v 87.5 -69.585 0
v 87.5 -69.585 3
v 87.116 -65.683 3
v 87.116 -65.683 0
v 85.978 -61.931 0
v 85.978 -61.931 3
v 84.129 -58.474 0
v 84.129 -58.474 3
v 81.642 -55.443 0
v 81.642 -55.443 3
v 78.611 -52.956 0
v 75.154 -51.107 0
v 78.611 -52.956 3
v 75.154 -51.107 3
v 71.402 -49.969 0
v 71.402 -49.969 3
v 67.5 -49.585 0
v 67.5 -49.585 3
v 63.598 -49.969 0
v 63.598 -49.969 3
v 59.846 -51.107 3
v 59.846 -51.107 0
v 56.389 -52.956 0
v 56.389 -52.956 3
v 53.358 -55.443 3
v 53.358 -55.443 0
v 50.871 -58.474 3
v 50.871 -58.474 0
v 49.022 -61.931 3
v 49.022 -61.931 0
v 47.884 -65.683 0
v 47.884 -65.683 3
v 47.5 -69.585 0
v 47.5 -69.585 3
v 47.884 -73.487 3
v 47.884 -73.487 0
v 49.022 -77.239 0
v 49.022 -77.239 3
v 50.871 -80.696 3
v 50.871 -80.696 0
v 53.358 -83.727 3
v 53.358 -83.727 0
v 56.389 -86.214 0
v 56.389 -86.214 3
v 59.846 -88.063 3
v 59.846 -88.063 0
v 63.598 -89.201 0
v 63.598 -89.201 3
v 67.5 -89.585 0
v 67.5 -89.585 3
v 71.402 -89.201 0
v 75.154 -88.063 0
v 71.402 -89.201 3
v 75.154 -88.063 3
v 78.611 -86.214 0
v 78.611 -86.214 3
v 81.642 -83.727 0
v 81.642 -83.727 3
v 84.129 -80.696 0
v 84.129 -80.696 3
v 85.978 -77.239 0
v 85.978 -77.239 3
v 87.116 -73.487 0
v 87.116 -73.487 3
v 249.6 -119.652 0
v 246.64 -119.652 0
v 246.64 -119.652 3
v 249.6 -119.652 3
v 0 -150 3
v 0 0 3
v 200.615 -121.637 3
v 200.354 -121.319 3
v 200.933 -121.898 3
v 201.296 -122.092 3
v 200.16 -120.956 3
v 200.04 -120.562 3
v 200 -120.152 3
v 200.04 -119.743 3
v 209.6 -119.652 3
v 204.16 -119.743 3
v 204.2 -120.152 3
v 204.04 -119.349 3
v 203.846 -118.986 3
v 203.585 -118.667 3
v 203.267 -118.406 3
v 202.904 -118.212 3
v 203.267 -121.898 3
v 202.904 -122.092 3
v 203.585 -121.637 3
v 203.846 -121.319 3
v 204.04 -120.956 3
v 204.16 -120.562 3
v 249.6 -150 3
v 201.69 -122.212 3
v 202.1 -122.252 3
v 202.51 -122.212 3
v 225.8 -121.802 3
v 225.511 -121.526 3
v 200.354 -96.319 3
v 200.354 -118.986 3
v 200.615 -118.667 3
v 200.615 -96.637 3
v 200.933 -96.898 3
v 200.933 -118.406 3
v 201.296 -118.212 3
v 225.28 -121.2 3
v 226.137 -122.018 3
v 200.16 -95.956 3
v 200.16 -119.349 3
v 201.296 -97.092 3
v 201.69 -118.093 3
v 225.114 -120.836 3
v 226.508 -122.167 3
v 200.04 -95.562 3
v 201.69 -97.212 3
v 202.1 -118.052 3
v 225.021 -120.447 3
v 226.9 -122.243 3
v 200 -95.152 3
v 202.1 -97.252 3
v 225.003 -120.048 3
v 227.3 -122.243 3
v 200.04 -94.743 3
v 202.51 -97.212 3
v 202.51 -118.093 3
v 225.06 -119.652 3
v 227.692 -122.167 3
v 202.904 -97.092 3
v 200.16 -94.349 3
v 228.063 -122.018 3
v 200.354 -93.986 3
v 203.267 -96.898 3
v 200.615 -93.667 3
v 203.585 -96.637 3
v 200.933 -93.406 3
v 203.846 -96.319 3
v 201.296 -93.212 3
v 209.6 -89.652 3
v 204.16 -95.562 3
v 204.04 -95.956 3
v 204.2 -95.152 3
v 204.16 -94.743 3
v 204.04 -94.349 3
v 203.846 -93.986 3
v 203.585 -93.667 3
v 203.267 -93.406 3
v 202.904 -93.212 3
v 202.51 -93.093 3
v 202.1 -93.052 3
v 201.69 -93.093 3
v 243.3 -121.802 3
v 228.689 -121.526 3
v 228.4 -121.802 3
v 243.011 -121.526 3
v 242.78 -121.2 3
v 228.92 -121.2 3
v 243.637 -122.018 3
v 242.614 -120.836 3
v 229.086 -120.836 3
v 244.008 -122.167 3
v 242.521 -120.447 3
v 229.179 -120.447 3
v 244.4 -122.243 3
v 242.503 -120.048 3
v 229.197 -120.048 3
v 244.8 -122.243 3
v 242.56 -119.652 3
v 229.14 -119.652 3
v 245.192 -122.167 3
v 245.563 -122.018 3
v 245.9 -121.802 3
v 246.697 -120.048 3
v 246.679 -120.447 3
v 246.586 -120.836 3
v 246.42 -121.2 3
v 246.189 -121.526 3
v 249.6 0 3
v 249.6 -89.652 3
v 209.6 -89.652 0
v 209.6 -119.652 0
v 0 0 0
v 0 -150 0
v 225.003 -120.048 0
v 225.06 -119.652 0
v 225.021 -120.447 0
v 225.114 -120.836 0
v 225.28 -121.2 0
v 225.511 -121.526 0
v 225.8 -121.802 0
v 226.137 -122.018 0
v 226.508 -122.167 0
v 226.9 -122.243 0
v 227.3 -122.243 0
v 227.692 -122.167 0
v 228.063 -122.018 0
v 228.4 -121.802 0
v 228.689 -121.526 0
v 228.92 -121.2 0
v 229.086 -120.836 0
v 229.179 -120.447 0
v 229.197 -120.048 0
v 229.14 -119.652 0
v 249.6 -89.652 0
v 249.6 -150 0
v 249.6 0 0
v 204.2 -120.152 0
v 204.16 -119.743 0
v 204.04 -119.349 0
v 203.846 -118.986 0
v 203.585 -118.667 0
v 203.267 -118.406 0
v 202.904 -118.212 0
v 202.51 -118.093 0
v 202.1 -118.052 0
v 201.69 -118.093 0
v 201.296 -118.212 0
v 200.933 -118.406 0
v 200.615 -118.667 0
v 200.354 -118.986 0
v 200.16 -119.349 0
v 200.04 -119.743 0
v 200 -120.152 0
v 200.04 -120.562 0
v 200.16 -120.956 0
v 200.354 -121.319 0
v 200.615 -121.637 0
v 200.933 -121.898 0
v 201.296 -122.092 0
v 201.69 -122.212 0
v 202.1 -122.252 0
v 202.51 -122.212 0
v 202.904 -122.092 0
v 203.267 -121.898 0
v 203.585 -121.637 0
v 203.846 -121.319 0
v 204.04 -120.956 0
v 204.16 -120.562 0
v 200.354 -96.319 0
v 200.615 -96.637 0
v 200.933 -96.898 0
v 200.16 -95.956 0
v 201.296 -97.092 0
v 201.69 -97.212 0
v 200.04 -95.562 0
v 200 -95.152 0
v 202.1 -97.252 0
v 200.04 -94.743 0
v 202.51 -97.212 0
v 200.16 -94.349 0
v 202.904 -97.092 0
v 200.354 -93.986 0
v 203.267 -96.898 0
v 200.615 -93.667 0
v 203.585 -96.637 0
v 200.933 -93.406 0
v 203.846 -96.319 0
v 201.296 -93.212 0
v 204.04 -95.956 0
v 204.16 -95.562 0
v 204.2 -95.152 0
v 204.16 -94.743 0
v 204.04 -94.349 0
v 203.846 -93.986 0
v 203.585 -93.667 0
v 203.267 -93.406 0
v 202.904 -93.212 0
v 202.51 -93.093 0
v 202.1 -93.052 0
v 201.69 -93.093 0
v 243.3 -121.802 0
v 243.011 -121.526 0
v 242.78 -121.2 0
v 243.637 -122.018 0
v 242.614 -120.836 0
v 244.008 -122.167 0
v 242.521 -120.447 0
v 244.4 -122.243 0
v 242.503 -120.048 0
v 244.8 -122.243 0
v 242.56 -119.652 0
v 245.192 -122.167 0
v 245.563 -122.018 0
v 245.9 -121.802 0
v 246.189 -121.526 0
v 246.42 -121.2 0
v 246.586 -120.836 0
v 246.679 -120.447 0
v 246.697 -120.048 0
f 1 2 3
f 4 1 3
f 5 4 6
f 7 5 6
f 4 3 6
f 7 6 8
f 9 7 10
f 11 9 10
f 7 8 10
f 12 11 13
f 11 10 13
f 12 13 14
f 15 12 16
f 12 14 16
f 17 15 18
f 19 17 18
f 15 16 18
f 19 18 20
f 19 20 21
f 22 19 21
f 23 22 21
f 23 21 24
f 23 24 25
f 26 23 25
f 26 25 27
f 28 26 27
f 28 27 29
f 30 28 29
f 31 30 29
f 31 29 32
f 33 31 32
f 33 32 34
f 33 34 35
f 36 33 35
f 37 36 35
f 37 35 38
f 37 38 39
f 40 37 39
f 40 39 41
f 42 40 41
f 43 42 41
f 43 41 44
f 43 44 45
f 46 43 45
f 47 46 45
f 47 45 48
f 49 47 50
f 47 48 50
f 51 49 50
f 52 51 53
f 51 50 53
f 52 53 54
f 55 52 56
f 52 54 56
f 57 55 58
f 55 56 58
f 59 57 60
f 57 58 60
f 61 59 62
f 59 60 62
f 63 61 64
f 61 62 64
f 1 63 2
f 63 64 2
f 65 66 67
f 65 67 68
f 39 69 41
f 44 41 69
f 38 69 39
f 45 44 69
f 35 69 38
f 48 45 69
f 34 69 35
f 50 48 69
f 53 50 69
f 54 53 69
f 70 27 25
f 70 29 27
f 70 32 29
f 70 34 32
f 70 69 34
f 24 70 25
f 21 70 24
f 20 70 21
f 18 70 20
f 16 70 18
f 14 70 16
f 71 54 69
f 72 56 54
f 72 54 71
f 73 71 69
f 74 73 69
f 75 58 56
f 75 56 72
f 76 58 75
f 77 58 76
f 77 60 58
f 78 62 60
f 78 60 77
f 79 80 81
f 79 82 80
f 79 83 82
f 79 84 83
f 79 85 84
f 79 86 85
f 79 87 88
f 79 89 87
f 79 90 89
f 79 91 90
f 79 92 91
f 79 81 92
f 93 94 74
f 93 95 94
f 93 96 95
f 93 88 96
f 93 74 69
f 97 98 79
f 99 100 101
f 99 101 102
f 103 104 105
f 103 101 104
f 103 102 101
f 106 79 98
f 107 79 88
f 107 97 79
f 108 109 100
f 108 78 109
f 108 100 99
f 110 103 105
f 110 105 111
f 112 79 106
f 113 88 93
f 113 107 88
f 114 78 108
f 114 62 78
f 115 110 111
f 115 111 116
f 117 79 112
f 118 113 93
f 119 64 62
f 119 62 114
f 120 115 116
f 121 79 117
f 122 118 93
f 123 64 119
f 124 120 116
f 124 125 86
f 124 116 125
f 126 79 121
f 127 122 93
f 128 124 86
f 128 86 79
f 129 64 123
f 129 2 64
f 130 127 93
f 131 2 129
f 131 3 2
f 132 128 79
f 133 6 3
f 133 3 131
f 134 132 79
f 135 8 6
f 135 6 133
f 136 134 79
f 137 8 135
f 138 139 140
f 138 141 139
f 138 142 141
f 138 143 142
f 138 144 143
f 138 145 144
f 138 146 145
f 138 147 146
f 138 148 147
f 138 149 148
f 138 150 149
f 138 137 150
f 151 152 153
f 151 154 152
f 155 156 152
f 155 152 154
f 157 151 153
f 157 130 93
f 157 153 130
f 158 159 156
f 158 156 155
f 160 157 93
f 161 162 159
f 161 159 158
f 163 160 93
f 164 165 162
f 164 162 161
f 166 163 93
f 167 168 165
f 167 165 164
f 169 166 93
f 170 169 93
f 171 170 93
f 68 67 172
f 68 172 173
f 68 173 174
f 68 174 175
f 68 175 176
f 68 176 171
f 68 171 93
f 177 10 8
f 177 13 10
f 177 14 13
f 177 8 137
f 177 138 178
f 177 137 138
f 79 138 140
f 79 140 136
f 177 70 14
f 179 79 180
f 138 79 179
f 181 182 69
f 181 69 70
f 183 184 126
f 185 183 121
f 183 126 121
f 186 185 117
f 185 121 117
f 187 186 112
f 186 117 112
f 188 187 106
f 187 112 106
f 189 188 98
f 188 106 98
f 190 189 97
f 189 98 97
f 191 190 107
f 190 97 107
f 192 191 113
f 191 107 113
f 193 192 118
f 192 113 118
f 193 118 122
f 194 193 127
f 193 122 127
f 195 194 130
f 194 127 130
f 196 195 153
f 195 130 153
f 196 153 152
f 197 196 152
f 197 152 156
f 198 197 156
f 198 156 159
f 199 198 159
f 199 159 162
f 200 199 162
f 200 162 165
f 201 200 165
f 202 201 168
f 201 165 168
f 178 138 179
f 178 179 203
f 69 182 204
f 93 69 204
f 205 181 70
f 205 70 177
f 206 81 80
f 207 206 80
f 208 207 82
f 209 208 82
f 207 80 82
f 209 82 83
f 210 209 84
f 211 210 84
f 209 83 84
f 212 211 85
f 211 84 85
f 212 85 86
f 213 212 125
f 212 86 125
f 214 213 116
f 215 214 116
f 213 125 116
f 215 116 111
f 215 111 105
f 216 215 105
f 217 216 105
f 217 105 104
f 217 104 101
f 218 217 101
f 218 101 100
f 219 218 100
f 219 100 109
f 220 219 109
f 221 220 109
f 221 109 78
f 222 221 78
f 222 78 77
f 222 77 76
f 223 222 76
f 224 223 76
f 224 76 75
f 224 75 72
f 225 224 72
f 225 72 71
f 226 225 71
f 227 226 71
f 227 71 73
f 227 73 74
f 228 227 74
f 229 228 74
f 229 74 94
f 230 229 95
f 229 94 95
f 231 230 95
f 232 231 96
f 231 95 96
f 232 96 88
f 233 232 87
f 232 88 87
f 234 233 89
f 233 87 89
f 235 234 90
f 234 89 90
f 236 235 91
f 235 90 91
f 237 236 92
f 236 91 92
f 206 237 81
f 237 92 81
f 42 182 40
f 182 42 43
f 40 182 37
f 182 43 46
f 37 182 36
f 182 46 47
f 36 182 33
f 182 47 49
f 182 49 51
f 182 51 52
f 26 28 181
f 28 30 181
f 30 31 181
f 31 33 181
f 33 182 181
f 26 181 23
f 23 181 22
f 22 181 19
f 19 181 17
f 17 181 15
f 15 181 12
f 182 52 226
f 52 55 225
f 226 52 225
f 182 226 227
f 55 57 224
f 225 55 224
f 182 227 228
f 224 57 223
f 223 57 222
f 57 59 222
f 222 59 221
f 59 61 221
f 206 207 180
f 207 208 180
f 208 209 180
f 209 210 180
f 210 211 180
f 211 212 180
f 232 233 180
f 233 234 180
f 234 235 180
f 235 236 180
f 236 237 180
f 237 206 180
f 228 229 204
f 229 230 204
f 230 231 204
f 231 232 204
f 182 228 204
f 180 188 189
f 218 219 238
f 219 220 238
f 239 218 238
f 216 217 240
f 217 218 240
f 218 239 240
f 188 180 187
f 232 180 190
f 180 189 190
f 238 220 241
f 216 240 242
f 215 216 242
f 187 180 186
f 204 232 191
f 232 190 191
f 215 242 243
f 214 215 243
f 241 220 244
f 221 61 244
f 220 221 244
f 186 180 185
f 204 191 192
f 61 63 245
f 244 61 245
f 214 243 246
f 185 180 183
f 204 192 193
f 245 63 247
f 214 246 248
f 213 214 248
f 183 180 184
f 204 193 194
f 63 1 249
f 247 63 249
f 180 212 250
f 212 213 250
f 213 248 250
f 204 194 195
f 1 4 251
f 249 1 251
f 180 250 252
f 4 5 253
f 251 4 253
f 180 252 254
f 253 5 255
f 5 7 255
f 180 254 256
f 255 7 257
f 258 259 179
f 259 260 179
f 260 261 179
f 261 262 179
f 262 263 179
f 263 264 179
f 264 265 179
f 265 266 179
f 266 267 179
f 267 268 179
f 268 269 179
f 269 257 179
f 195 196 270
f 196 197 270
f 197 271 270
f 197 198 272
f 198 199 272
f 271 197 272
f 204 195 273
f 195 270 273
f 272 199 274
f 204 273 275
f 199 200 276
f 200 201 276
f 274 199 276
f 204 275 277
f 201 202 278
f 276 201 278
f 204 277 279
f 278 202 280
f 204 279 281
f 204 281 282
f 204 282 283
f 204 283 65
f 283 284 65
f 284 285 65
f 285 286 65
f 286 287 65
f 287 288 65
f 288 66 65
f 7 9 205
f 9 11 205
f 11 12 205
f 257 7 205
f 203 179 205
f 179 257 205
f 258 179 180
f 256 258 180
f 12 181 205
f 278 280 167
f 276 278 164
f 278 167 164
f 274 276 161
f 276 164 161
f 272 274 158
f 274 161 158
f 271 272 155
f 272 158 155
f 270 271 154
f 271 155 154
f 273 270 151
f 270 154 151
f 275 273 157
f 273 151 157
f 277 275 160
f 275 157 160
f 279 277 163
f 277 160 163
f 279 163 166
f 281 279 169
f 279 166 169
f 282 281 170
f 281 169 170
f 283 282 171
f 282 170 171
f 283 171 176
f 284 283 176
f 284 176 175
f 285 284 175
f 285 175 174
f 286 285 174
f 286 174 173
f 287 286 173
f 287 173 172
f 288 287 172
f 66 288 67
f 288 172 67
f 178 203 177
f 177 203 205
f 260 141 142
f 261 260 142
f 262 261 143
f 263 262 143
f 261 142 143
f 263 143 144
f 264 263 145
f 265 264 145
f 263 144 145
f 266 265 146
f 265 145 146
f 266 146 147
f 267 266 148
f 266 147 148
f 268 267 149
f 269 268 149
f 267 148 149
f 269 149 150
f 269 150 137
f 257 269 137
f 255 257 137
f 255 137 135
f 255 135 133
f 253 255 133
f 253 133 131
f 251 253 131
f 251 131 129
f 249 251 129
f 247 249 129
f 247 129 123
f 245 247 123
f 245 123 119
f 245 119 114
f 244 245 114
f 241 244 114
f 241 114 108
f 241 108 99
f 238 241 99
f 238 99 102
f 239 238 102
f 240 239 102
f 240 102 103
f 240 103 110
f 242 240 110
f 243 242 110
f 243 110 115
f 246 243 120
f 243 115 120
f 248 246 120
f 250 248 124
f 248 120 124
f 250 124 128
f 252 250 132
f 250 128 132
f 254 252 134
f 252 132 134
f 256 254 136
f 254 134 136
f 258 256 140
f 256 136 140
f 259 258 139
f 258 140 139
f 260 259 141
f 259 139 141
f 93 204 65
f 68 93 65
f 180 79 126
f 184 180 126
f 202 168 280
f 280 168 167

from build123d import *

# Parameters (mm, degrees)
SKETCH1_W           = 249.6
SKETCH1_H           = 150
BOSS_EXTRUDE1_DEPTH = 3
SKETCH2_R           = 20
CUT_EXTRUDE1_DEPTH  = 4
SKETCH3_W           = 40
SKETCH3_H           = 30
CUT_EXTRUDE2_DEPTH  = 5
SKETCH4_R           = 2.1
SKETCH4_R_2         = 4
CUT_EXTRUDE3_DEPTH  = 4


with BuildPart() as part:
    # Sketch1 → Boss-Extrude1 (new body)
    with BuildSketch(Plane.XY):
        with Locations((124.8, -75)):
            Rectangle(SKETCH1_W, SKETCH1_H)
    extrude(amount=BOSS_EXTRUDE1_DEPTH)

    # Sketch2 → Cut-Extrude1 (cut, through all)
    with BuildSketch(Plane.XY.offset(3)):
        with Locations((67.5, -69.58494332)):
            Circle(SKETCH2_R)
    extrude(amount=-CUT_EXTRUDE1_DEPTH, mode=Mode.SUBTRACT)

    # Sketch3 → Cut-Extrude2 (cut)
    with BuildSketch(Plane.XY.offset(3)):
        with Locations((229.6, -104.652337216)):
            Rectangle(SKETCH3_W, SKETCH3_H)
    extrude(amount=-CUT_EXTRUDE2_DEPTH, mode=Mode.SUBTRACT)

    # Sketch4 → Cut-Extrude3 (cut, through all)
    with BuildSketch(Plane.XY.offset(3)):
        with Locations((244.6, -120.152337216)):
            Circle(SKETCH4_R)
        with Locations((227.1, -120.152337216)):
            Circle(SKETCH4_R)
        with Locations((239.6, -107.652337216)):
            Circle(SKETCH4_R_2)
        with Locations((244.6, -95.152337216)):
            Circle(SKETCH4_R)
        with Locations((227.1, -95.152337216)):
            Circle(SKETCH4_R)
        with Locations((202.1, -120.152337216)):
            Circle(SKETCH4_R)
        with Locations((202.1, -95.152337216)):
            Circle(SKETCH4_R)
        with Locations((214.6, -107.652337216)):
            Circle(SKETCH4_R_2)
    extrude(amount=-CUT_EXTRUDE3_DEPTH, mode=Mode.SUBTRACT)


solid = part.part
